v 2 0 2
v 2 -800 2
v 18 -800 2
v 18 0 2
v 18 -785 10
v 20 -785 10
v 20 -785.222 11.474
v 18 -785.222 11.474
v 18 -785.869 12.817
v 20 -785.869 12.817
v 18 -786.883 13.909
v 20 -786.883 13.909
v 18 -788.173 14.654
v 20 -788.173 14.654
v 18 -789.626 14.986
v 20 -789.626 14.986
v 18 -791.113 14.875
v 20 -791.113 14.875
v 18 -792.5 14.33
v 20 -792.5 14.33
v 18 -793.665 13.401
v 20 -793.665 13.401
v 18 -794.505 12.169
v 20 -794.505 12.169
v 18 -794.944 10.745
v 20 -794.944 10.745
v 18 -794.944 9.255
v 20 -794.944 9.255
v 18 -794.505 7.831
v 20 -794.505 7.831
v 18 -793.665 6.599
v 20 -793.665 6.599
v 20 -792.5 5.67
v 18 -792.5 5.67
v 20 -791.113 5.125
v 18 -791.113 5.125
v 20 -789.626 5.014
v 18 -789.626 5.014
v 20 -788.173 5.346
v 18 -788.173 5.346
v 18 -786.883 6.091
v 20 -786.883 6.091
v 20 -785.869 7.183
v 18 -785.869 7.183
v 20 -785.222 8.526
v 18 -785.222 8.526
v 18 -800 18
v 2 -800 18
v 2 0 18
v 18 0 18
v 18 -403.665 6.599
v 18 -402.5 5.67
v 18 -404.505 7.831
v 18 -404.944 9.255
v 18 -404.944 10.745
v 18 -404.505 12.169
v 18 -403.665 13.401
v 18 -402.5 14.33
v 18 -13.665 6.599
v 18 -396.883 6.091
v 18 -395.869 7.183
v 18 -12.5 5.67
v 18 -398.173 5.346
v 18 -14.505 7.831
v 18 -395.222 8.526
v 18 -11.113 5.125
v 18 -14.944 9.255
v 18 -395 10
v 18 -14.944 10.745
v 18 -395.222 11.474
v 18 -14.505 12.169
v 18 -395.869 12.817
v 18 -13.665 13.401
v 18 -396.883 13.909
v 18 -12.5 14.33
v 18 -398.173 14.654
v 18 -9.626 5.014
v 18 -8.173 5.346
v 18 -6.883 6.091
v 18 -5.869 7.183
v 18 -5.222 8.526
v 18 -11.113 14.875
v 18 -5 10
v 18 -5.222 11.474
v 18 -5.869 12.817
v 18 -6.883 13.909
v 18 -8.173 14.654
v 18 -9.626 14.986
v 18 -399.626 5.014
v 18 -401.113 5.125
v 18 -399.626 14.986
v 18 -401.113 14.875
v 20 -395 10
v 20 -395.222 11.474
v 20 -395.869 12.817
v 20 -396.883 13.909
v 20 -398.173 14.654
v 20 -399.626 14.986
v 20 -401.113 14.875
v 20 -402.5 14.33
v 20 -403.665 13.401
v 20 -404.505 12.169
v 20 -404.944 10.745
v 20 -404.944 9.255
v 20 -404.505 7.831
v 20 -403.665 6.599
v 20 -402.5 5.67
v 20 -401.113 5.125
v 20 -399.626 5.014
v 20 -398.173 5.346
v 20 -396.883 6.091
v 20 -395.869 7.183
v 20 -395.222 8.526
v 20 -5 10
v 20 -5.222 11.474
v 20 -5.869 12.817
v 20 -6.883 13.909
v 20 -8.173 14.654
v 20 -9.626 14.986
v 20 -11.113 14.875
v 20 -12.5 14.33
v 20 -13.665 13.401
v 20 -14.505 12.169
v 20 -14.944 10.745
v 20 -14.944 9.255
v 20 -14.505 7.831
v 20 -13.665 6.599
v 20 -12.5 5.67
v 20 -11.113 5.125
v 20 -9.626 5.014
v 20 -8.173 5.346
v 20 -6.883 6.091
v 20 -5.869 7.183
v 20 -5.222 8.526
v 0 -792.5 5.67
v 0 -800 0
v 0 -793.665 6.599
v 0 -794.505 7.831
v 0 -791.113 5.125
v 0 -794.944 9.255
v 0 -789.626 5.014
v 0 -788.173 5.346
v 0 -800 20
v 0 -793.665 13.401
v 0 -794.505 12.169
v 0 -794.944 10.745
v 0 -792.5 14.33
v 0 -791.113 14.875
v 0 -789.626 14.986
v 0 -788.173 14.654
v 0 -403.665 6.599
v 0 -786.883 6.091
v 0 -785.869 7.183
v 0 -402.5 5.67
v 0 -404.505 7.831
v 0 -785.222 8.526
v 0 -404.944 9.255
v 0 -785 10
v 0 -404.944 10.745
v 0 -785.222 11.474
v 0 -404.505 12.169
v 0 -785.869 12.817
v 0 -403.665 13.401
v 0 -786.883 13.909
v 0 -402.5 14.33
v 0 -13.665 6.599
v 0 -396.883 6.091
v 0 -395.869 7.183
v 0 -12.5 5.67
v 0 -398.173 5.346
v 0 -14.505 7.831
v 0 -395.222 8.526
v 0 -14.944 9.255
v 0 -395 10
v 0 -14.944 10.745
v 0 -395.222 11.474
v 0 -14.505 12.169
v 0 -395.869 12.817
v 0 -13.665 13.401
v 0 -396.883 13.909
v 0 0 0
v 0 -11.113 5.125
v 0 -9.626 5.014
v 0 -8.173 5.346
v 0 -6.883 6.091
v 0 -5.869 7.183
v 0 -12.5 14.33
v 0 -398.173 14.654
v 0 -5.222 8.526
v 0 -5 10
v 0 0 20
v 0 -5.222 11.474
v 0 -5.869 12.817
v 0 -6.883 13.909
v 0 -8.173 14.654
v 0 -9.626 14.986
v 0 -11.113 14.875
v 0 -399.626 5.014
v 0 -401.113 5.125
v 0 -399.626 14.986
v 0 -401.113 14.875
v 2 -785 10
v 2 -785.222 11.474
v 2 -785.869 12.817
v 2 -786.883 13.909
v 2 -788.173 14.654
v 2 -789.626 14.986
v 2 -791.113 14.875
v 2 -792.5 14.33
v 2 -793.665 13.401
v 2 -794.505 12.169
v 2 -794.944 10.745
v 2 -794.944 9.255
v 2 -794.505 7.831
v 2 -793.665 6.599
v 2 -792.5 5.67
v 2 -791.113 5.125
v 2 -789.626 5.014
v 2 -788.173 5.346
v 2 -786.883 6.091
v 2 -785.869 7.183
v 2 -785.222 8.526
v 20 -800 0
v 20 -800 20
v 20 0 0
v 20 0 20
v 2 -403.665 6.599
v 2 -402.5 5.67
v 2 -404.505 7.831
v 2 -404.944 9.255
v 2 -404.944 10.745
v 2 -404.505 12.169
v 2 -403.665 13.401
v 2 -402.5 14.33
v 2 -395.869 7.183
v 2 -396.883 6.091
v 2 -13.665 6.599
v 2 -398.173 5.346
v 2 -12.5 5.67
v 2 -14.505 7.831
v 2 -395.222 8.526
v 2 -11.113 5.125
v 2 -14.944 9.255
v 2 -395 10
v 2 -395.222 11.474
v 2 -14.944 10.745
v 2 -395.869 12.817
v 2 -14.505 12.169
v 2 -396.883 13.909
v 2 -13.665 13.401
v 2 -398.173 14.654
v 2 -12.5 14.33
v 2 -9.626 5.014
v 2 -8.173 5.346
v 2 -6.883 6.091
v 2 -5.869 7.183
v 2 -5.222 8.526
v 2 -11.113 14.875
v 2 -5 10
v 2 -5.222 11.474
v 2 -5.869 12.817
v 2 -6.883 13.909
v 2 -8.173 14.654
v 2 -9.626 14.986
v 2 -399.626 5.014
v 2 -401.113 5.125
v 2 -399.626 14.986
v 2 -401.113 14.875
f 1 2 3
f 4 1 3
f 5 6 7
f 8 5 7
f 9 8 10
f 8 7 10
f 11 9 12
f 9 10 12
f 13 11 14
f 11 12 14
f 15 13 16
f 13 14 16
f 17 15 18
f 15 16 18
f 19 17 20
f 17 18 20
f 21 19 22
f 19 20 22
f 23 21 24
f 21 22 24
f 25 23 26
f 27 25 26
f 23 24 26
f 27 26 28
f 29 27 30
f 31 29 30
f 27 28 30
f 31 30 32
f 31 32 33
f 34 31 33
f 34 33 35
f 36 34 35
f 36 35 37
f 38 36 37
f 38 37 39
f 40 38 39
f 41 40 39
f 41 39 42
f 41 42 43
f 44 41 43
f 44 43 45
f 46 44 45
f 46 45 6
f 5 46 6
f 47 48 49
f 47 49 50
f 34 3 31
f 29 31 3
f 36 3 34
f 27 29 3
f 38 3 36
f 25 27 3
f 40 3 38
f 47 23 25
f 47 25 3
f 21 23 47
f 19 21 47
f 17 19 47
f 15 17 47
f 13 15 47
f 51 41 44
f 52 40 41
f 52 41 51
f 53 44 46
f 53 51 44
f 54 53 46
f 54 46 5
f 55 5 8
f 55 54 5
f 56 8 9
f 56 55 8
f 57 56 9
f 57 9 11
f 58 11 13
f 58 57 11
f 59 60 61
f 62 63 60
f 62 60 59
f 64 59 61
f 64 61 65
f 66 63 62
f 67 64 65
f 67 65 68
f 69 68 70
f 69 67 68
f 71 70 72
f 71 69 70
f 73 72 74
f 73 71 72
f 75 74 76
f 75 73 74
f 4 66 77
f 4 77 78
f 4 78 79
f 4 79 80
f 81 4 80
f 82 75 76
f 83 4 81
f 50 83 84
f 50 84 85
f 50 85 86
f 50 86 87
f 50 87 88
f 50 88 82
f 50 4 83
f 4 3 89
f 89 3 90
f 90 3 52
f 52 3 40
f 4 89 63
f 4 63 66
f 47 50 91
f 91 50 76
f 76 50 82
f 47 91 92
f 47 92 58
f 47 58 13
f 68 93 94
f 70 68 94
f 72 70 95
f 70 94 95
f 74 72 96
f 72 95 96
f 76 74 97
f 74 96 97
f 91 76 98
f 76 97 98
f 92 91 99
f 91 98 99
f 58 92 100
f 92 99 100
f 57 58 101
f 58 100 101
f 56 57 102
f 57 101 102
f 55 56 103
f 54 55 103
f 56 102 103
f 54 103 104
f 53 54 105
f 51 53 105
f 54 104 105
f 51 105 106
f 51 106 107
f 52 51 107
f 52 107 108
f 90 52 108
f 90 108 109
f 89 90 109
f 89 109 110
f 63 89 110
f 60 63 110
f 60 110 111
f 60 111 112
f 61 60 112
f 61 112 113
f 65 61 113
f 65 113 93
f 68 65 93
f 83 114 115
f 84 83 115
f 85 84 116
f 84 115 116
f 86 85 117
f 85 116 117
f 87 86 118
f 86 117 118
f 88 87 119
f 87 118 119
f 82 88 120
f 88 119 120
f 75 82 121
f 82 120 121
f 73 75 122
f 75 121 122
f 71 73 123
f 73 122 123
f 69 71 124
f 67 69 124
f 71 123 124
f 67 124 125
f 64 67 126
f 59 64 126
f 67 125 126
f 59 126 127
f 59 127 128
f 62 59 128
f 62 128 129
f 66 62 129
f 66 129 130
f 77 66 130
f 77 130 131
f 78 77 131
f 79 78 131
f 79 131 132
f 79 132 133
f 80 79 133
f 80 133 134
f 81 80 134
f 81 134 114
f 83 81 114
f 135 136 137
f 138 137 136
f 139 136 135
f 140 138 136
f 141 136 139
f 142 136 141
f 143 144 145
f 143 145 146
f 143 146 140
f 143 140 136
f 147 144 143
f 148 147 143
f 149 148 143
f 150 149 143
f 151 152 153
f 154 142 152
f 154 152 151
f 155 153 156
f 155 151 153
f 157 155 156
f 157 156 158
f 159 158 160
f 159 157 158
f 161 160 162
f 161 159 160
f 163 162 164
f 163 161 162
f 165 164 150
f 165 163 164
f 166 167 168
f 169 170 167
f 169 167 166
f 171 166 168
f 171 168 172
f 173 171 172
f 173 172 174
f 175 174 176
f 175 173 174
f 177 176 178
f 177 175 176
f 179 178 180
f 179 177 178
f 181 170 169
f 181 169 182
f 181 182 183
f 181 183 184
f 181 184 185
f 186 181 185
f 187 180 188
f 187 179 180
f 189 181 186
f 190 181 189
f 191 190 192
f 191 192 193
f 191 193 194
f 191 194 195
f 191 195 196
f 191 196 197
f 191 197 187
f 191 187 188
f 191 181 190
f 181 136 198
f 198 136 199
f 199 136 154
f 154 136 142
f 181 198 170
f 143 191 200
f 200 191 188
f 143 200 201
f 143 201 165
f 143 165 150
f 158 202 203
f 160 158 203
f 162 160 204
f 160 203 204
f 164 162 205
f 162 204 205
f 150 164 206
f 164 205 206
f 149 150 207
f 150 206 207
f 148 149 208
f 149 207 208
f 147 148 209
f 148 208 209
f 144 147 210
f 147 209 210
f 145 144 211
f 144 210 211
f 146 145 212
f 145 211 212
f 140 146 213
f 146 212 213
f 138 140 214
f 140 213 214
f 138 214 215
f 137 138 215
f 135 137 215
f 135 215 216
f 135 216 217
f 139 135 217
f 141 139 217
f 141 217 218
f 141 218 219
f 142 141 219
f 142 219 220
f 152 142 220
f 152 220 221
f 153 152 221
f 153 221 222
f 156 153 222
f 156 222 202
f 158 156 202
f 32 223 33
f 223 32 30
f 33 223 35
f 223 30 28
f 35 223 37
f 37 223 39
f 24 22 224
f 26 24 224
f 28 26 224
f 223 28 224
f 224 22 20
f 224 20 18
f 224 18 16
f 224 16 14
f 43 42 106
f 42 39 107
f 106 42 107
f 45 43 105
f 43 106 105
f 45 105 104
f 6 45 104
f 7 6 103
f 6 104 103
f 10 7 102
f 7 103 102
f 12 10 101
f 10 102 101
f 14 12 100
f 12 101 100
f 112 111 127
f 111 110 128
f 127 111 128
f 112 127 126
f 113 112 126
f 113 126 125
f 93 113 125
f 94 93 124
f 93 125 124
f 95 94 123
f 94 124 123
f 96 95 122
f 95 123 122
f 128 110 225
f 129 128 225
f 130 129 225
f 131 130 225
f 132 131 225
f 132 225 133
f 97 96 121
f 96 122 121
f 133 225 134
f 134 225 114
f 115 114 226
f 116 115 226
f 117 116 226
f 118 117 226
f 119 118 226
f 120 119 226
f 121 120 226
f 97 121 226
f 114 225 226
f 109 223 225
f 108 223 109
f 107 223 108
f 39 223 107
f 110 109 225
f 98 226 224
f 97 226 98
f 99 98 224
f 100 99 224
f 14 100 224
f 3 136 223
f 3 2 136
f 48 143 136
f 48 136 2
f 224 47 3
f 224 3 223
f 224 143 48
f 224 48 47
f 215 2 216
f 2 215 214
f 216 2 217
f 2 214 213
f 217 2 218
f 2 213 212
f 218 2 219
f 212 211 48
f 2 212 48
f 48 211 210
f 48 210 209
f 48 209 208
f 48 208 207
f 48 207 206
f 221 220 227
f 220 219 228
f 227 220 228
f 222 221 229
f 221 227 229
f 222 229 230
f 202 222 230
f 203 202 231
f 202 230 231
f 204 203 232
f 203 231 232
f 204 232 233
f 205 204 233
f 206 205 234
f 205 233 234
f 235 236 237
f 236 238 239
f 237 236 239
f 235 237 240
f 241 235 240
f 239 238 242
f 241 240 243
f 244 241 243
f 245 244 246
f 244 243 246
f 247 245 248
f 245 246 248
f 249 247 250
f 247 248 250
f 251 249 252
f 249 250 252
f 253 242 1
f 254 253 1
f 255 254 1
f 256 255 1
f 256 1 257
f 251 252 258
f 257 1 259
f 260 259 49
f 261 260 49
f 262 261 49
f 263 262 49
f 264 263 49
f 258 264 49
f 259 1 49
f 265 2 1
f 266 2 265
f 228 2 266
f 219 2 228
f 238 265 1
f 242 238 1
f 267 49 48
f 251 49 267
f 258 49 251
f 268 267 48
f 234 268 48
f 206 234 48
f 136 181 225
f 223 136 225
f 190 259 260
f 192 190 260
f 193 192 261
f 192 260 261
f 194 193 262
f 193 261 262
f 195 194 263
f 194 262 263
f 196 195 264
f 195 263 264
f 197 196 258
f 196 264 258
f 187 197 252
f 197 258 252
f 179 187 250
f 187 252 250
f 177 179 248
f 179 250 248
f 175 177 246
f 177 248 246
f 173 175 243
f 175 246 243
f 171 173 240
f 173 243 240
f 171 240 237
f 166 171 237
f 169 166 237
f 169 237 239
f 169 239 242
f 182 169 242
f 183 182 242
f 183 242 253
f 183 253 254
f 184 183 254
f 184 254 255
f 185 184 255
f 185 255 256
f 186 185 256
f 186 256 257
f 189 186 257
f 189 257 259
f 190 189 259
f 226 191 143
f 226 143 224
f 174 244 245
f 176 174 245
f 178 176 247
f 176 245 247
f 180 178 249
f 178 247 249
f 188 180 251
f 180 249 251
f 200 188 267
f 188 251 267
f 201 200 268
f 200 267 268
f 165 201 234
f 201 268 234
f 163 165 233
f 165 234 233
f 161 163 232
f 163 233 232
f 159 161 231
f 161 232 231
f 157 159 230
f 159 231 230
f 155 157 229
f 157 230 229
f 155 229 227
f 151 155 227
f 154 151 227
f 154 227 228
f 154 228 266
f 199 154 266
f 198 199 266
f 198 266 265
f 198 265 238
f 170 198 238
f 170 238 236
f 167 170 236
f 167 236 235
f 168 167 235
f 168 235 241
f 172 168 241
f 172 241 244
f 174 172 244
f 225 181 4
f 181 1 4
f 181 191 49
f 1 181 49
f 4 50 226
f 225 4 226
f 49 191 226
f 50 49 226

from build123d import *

# Parameters (mm, degrees)
F0_W     = 20
F0_H     = 20
F0_W_2   = 16
F0_H_2   = 16
F1_DEPTH = 800
F2_R     = 5
F3_DEPTH = 20.001


with BuildPart() as f1:
    # F0 (on Front) → F1 (new body)
    with BuildSketch(Plane.XZ):
        with Locations((10, 10)):
            Rectangle(F0_W, F0_H)
        with Locations((10, 10)):
            Rectangle(F0_W_2, F0_H_2, mode=Mode.SUBTRACT)
    extrude(amount=F1_DEPTH)

    # F2 (on face) → F3 (cut, through all)
    with BuildSketch(Plane.YZ.offset(20)):
        with Locations((-790, 10)):
            Circle(F2_R)
        with Locations((-400, 10)):
            Circle(F2_R)
        with Locations((-10, 10)):
            Circle(F2_R)
    extrude(amount=-F3_DEPTH, mode=Mode.SUBTRACT)


solid = f1.part
